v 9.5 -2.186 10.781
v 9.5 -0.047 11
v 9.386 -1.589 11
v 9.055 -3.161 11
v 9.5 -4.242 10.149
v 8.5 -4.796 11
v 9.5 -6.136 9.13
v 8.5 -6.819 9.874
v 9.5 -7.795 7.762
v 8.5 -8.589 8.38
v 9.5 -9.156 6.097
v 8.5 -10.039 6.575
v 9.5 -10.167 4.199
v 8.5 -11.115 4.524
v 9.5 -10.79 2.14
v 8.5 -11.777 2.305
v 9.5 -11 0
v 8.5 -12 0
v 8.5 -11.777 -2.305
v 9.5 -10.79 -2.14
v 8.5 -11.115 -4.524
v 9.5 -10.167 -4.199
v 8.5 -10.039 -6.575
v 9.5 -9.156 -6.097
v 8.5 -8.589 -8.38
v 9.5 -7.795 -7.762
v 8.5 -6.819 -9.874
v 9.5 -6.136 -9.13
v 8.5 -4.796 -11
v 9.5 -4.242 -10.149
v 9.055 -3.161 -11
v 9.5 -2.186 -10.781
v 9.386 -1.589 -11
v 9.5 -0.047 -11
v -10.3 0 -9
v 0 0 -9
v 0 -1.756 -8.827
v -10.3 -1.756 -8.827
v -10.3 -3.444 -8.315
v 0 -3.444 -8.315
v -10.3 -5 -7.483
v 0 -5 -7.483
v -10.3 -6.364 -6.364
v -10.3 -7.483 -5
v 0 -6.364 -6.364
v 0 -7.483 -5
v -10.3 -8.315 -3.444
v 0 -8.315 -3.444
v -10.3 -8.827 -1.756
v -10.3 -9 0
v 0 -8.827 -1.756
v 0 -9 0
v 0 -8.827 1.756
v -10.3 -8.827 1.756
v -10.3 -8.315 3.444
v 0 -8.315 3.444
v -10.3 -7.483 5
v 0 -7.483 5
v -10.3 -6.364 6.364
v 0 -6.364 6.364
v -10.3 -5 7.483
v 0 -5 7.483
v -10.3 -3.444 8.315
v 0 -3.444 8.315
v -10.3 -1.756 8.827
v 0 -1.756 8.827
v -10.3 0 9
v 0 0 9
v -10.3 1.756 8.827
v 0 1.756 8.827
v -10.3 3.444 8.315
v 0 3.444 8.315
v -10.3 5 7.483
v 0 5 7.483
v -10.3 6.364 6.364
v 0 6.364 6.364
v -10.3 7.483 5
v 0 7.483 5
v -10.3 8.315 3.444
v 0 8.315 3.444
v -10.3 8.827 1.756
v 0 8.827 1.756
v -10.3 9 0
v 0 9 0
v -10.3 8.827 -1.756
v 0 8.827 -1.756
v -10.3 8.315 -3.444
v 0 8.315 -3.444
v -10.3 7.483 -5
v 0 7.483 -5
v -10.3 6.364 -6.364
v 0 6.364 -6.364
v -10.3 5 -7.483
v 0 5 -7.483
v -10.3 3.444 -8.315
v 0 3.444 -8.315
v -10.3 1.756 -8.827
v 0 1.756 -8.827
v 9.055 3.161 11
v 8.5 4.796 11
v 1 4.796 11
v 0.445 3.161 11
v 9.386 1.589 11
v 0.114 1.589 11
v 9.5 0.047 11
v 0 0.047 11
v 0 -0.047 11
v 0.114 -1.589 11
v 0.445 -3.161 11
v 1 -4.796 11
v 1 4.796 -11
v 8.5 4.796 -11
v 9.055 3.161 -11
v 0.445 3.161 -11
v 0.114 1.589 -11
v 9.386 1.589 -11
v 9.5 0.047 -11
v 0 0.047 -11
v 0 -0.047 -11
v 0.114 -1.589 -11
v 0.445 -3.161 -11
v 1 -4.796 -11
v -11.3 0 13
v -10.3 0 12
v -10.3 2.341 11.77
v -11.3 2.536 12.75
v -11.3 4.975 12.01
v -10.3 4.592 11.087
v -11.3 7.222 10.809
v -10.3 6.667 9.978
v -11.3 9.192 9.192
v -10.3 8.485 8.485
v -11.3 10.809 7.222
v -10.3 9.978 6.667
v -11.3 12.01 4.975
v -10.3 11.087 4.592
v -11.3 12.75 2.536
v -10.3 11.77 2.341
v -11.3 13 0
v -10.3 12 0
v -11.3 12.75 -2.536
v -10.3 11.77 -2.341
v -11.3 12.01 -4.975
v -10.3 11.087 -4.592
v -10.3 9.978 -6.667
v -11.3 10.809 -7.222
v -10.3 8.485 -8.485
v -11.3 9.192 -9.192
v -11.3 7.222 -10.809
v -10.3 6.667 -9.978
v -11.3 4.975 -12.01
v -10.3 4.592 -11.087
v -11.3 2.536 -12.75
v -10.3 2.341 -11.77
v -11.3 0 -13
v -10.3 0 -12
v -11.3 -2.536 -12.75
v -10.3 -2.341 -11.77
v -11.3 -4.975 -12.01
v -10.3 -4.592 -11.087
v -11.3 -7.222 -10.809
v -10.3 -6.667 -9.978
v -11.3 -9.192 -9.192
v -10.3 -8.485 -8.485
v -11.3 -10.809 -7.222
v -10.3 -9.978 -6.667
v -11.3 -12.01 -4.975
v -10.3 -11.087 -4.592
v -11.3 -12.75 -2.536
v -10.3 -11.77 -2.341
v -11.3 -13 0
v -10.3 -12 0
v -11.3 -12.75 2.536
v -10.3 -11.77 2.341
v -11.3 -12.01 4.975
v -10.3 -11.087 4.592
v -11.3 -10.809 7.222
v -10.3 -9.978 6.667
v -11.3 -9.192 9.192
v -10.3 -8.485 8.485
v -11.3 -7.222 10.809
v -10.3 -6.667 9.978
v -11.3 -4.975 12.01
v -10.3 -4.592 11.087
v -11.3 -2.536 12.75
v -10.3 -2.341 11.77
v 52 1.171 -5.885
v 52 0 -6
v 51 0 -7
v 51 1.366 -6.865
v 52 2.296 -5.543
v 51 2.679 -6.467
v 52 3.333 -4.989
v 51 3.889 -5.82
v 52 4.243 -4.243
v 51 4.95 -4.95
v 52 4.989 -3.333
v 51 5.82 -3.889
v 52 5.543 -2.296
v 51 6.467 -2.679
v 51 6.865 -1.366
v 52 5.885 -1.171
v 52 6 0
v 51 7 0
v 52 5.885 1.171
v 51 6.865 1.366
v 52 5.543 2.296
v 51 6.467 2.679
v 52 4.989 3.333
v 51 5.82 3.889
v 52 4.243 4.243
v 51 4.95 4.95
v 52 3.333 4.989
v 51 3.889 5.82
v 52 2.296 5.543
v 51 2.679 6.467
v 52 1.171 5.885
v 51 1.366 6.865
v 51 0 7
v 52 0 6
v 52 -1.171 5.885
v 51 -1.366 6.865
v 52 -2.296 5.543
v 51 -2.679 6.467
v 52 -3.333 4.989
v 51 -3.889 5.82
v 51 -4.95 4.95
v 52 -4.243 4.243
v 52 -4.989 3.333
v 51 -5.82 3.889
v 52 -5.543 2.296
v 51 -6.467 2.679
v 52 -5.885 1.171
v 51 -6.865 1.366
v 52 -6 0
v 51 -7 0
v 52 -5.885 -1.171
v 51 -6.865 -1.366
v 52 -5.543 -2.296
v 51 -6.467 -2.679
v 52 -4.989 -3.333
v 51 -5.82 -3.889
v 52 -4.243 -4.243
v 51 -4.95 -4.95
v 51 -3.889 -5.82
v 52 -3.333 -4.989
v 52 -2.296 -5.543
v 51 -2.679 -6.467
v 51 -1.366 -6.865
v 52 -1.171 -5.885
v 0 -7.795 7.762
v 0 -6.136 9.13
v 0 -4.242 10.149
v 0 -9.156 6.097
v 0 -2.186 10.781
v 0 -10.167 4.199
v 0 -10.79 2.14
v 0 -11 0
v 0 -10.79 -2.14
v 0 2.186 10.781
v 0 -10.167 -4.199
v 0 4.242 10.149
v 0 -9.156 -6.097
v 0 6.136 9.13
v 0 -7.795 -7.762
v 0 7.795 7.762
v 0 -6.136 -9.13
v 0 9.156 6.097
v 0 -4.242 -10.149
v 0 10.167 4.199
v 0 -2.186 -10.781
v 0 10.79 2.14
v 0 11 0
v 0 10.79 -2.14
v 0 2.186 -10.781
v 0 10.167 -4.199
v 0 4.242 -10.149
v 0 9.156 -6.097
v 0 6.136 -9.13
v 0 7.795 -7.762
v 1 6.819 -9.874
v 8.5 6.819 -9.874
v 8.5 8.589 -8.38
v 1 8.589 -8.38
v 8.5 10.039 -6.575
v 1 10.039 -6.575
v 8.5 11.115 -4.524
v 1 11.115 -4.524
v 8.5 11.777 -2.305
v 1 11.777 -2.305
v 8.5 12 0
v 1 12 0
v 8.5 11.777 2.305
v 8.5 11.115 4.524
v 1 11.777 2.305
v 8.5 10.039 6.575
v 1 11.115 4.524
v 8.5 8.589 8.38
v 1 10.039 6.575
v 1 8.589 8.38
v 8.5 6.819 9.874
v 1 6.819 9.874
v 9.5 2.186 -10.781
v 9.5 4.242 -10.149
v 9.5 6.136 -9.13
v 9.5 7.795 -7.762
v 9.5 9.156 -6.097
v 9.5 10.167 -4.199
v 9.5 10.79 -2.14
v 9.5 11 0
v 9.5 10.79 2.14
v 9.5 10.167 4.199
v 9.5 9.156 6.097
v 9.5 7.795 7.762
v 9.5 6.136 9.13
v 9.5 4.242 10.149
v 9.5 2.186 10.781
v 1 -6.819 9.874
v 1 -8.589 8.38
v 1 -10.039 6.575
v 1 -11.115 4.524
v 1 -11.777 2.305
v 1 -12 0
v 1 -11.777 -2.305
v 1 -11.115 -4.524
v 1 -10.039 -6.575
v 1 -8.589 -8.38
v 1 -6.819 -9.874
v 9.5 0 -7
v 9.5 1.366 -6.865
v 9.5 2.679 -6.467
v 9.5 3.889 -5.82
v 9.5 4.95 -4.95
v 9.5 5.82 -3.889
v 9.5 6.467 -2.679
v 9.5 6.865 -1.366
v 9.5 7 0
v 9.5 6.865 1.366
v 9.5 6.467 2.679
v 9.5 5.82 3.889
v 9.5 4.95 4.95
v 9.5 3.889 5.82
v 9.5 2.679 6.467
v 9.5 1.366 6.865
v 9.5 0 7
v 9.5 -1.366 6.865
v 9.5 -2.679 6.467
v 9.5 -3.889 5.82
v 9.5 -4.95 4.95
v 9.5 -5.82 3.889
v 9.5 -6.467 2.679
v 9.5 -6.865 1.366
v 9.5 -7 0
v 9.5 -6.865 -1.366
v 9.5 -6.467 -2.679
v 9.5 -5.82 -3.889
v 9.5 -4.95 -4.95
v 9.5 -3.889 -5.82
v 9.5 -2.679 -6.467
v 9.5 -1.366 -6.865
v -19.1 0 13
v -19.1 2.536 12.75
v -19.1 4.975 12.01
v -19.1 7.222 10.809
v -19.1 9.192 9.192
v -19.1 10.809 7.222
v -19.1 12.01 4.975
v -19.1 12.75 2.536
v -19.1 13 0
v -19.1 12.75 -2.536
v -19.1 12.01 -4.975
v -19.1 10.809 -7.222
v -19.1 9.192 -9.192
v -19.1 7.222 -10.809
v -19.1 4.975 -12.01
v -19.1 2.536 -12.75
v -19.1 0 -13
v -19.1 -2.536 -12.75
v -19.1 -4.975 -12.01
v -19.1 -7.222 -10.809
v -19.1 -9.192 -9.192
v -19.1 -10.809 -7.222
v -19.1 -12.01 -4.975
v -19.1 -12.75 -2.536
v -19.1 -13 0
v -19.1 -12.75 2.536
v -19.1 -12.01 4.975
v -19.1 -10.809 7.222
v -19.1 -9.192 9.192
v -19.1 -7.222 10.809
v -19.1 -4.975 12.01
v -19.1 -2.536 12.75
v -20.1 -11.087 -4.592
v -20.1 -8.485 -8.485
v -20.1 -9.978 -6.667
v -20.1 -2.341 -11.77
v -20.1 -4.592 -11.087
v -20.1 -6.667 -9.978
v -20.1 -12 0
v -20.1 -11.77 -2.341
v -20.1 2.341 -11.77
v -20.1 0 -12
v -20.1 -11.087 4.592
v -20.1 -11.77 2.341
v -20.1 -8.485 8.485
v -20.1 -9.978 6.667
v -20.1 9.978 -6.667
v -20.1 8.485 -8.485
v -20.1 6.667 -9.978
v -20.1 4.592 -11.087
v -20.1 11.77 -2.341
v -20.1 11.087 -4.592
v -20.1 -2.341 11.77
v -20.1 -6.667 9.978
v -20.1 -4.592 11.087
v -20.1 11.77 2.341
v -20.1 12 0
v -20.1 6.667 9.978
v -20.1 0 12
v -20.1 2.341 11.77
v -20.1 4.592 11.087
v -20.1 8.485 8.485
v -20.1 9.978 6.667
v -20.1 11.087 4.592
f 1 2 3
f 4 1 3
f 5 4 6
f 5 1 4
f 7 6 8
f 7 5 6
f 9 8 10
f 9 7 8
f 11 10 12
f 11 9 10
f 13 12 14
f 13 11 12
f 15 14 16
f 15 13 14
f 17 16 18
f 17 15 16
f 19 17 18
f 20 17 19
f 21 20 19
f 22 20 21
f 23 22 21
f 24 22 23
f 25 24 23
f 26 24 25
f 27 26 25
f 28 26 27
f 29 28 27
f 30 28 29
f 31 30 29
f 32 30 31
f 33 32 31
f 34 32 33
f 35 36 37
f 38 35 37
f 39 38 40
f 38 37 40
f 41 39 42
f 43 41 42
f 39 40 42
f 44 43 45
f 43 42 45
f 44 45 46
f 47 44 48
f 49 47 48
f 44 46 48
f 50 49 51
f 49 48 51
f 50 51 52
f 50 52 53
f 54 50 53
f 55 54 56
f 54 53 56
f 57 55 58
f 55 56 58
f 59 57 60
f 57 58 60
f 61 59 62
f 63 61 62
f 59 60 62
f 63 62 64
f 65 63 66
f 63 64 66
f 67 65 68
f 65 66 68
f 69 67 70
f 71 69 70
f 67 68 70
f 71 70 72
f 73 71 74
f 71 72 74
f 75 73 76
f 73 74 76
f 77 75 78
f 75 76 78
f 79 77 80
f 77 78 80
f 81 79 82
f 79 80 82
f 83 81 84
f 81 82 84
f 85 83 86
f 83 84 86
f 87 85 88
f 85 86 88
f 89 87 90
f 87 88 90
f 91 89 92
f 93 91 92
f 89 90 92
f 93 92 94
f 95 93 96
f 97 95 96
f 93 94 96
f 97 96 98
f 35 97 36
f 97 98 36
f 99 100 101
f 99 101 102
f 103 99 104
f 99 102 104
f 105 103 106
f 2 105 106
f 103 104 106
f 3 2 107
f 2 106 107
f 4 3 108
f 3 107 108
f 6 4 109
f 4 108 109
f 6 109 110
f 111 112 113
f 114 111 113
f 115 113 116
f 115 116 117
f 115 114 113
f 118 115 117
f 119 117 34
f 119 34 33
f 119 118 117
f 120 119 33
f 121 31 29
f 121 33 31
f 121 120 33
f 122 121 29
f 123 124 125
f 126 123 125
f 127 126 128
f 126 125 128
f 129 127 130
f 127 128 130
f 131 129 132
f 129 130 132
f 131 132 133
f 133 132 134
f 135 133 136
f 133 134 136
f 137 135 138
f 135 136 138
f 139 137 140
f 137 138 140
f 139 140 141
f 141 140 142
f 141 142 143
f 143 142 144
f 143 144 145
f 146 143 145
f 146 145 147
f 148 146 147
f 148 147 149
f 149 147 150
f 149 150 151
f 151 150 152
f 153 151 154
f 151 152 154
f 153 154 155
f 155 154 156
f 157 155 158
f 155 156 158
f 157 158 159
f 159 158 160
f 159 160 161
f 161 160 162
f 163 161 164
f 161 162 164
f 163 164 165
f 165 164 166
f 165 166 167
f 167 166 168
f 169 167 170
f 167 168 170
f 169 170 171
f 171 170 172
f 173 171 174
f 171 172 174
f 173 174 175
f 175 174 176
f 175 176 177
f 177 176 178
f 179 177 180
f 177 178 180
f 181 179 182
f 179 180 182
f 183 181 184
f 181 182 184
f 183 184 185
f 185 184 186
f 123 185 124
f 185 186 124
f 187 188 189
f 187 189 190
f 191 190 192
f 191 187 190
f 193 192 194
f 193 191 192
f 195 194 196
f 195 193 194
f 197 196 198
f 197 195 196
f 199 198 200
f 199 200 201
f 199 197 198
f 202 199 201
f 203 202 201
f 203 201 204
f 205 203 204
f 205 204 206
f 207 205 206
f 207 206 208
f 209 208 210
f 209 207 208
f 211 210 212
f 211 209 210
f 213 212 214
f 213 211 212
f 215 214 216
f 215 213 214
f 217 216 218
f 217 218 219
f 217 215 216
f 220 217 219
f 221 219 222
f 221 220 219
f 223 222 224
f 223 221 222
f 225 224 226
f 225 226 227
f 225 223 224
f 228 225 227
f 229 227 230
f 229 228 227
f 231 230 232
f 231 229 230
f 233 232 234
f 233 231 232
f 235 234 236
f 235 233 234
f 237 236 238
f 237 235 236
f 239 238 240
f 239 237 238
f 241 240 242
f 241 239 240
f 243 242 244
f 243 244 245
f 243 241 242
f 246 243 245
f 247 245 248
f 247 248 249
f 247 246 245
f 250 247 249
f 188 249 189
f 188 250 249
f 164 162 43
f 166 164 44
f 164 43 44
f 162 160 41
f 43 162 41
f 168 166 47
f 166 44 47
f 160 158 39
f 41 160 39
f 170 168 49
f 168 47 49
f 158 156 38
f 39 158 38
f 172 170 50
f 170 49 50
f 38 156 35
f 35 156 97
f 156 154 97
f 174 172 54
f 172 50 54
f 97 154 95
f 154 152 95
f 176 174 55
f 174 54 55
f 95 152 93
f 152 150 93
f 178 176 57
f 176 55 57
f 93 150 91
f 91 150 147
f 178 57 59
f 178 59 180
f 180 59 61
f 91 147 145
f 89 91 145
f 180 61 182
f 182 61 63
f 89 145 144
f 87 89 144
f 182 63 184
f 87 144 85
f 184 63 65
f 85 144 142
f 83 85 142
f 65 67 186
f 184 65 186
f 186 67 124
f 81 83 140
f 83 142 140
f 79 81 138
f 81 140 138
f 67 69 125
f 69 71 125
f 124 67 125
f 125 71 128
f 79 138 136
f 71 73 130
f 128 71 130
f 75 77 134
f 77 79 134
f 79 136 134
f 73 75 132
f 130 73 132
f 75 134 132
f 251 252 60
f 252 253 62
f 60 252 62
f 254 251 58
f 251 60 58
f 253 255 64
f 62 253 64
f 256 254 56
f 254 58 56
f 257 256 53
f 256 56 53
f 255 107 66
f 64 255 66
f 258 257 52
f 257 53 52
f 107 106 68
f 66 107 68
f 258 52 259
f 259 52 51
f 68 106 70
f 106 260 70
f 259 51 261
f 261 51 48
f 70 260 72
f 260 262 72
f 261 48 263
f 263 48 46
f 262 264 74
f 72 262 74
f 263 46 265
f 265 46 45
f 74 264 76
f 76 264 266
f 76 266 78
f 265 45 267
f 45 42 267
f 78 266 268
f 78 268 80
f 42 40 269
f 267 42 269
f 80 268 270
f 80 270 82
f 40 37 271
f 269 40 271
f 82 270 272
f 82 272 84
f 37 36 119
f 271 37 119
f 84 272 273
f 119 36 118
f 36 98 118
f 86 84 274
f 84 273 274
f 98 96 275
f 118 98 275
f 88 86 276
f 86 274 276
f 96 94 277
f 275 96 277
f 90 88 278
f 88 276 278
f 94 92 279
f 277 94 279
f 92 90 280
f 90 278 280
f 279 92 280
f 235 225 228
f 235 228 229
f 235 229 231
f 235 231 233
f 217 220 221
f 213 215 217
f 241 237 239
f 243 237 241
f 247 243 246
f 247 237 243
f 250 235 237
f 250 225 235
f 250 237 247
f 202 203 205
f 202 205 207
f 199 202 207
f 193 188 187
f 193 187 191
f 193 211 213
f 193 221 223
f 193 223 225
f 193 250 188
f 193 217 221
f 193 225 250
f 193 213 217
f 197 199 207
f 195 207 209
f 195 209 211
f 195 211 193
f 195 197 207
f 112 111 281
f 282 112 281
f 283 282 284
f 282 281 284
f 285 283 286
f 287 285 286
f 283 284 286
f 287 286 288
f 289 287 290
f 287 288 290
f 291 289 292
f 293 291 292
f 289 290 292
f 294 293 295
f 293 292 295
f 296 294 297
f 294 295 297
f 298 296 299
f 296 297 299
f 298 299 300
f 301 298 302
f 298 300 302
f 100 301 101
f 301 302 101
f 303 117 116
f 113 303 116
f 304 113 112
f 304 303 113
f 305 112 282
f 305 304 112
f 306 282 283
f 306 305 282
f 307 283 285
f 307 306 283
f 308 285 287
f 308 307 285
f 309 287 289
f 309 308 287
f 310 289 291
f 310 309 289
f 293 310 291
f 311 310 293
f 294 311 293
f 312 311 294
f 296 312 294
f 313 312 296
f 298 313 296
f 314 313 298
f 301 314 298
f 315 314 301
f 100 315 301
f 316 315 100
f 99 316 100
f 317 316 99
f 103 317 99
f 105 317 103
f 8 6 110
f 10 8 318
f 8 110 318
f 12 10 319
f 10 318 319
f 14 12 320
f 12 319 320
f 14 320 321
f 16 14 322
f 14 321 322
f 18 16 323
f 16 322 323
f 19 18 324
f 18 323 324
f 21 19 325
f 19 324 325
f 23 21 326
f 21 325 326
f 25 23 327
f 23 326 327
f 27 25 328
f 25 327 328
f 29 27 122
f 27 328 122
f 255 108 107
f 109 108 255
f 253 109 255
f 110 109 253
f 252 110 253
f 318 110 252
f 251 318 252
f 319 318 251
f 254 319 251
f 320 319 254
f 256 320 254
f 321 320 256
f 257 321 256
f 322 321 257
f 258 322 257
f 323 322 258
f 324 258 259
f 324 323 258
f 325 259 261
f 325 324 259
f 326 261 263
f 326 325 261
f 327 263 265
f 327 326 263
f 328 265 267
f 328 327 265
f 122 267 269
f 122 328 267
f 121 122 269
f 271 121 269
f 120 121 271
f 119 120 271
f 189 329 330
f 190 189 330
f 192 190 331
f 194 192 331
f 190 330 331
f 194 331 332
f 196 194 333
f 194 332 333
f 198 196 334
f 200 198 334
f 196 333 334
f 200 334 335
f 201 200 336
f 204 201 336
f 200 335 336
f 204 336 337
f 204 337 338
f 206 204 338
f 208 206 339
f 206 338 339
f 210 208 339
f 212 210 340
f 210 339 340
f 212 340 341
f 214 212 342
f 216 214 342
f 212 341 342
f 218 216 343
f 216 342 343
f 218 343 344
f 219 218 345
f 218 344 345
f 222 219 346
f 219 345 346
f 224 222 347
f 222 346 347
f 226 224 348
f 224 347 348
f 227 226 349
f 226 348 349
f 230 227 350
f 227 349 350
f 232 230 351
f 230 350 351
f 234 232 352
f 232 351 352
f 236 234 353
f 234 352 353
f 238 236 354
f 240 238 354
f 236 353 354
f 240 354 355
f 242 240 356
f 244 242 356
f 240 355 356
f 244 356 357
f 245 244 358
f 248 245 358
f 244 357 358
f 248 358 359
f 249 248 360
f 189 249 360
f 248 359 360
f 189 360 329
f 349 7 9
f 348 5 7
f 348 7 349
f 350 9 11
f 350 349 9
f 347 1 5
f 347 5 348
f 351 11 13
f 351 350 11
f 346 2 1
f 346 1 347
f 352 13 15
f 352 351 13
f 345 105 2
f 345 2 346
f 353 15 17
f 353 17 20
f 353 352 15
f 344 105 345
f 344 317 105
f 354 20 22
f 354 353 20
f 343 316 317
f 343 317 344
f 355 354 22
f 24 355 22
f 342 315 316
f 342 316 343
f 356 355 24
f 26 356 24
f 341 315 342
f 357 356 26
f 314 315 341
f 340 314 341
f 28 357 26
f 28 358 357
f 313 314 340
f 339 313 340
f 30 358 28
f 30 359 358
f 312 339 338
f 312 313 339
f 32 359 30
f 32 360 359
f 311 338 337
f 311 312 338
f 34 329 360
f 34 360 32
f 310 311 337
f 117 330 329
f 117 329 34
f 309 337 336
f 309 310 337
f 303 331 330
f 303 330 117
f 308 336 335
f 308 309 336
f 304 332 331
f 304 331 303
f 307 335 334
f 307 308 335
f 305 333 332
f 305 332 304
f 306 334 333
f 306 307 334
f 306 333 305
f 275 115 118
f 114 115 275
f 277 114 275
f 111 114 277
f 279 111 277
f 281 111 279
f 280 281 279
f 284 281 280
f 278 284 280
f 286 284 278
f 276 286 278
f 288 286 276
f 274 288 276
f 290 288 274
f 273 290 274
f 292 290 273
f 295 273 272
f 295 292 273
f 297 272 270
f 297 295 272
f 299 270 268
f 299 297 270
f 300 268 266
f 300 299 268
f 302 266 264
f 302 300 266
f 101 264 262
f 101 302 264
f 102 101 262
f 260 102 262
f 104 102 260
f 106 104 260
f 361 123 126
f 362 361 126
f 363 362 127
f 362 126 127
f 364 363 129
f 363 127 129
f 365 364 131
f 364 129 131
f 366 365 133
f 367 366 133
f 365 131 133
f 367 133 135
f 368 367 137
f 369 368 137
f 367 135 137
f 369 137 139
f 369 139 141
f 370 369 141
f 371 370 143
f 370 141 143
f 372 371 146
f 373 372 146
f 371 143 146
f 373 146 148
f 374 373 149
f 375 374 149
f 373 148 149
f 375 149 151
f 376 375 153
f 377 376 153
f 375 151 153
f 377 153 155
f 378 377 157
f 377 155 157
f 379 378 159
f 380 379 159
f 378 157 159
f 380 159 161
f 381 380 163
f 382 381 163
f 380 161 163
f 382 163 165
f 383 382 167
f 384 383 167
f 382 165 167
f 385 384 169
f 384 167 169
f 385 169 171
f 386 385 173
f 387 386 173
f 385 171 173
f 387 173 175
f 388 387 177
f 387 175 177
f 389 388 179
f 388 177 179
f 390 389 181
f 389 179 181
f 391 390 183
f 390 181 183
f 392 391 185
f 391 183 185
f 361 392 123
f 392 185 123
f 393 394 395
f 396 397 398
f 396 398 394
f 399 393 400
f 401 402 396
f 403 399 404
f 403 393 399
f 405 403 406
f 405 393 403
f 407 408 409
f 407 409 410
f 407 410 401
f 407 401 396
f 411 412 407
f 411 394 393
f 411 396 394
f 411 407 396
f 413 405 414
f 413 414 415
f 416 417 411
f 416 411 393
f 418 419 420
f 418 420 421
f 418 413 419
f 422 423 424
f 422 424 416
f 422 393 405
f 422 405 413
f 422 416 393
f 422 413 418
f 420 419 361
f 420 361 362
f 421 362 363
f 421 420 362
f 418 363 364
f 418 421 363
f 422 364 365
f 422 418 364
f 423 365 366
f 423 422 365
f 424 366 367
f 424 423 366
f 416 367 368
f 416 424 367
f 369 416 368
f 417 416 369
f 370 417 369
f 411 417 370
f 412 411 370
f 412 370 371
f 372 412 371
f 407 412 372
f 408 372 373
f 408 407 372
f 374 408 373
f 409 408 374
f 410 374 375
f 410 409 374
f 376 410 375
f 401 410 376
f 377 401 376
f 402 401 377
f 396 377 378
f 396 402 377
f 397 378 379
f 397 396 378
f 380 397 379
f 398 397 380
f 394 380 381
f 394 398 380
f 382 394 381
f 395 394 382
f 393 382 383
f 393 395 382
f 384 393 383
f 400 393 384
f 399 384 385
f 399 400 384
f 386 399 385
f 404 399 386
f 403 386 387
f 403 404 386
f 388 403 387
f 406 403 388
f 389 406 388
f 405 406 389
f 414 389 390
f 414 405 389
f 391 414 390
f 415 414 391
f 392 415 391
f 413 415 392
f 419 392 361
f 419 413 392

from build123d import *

# Parameters (mm, degrees)
SKETCH_1_R          = 12
EXTRUDE_1_DEPTH     = 9.5
SKETCH_2_R          = 7
EXTRUDE_2_DEPTH     = 42.5
SKETCH_3_R          = 9
EXTRUDE_3_DEPTH     = 10.3
SKETCH_4_R          = 13
EXTRUDE_4_DEPTH     = 9.8
CUT_EXTRUDE_START   = -10
CUT_EXTRUDE_3_DEPTH = 10
CHAMFER_1_SIZE      = 1


with BuildPart() as part:
    # 草圖1 → 伸長1 (new body)
    with BuildSketch(Plane(origin=(0, 0, 0), x_dir=(0, 0, -1), z_dir=(1, 0, 0))):
        Circle(SKETCH_1_R)
    extrude(amount=EXTRUDE_1_DEPTH)

    # 草圖2 → 伸長2 (add)
    with BuildSketch(Plane(origin=(9.5, 0, 0), x_dir=(0, 0, -1), z_dir=(1, 0, 0))):
        Circle(SKETCH_2_R)
    extrude(amount=EXTRUDE_2_DEPTH)

    # 草圖3 → 伸長3 (add)
    with BuildSketch(Plane.ZY):
        with Locations(Location((0, 0, 0), (0, 0, 180))):
            Circle(SKETCH_3_R)
    extrude(amount=EXTRUDE_3_DEPTH)

    # 草圖4 → 伸長4 (add)
    with BuildSketch(Plane.ZY.offset(10.3)):
        Circle(SKETCH_4_R)
    extrude(amount=EXTRUDE_4_DEPTH)

    # 草圖5 → 除料-伸長3 (cut)
    with BuildSketch(Plane(origin=(9.5, 0, 0), x_dir=(0, 0, -1), z_dir=(1, 0, 0)).offset(CUT_EXTRUDE_START)):
        with BuildLine():
            Line((-11, 4.795831523), (-11, -4.795831523))
            ThreePointArc((-11, -4.795831523), (-12, 0), (-11, 4.795831523))
        make_face()
        with BuildLine():
            Line((11, 4.795831523), (11, -4.795831523))
            ThreePointArc((11, -4.795831523), (12, 0), (11, 4.795831523))
        make_face()
    extrude(amount=CUT_EXTRUDE_3_DEPTH, mode=Mode.SUBTRACT)

    # 導角1
    chamfer_1_edges = [part.edges().sort_by_distance(p)[0] for p in [
        (-20.1, 0, -13),
        (-10.3, 0, -13),
        (9.5, 12, 0),
        (9.5, -12, 0),
        (0, 12, 0),
        (0, -12, 0),
        (52, 0, 7),
    ]]
    chamfer(chamfer_1_edges, length=CHAMFER_1_SIZE - 0.0001)  # a hair under: the kernel refuses the full size


solid = part.part
